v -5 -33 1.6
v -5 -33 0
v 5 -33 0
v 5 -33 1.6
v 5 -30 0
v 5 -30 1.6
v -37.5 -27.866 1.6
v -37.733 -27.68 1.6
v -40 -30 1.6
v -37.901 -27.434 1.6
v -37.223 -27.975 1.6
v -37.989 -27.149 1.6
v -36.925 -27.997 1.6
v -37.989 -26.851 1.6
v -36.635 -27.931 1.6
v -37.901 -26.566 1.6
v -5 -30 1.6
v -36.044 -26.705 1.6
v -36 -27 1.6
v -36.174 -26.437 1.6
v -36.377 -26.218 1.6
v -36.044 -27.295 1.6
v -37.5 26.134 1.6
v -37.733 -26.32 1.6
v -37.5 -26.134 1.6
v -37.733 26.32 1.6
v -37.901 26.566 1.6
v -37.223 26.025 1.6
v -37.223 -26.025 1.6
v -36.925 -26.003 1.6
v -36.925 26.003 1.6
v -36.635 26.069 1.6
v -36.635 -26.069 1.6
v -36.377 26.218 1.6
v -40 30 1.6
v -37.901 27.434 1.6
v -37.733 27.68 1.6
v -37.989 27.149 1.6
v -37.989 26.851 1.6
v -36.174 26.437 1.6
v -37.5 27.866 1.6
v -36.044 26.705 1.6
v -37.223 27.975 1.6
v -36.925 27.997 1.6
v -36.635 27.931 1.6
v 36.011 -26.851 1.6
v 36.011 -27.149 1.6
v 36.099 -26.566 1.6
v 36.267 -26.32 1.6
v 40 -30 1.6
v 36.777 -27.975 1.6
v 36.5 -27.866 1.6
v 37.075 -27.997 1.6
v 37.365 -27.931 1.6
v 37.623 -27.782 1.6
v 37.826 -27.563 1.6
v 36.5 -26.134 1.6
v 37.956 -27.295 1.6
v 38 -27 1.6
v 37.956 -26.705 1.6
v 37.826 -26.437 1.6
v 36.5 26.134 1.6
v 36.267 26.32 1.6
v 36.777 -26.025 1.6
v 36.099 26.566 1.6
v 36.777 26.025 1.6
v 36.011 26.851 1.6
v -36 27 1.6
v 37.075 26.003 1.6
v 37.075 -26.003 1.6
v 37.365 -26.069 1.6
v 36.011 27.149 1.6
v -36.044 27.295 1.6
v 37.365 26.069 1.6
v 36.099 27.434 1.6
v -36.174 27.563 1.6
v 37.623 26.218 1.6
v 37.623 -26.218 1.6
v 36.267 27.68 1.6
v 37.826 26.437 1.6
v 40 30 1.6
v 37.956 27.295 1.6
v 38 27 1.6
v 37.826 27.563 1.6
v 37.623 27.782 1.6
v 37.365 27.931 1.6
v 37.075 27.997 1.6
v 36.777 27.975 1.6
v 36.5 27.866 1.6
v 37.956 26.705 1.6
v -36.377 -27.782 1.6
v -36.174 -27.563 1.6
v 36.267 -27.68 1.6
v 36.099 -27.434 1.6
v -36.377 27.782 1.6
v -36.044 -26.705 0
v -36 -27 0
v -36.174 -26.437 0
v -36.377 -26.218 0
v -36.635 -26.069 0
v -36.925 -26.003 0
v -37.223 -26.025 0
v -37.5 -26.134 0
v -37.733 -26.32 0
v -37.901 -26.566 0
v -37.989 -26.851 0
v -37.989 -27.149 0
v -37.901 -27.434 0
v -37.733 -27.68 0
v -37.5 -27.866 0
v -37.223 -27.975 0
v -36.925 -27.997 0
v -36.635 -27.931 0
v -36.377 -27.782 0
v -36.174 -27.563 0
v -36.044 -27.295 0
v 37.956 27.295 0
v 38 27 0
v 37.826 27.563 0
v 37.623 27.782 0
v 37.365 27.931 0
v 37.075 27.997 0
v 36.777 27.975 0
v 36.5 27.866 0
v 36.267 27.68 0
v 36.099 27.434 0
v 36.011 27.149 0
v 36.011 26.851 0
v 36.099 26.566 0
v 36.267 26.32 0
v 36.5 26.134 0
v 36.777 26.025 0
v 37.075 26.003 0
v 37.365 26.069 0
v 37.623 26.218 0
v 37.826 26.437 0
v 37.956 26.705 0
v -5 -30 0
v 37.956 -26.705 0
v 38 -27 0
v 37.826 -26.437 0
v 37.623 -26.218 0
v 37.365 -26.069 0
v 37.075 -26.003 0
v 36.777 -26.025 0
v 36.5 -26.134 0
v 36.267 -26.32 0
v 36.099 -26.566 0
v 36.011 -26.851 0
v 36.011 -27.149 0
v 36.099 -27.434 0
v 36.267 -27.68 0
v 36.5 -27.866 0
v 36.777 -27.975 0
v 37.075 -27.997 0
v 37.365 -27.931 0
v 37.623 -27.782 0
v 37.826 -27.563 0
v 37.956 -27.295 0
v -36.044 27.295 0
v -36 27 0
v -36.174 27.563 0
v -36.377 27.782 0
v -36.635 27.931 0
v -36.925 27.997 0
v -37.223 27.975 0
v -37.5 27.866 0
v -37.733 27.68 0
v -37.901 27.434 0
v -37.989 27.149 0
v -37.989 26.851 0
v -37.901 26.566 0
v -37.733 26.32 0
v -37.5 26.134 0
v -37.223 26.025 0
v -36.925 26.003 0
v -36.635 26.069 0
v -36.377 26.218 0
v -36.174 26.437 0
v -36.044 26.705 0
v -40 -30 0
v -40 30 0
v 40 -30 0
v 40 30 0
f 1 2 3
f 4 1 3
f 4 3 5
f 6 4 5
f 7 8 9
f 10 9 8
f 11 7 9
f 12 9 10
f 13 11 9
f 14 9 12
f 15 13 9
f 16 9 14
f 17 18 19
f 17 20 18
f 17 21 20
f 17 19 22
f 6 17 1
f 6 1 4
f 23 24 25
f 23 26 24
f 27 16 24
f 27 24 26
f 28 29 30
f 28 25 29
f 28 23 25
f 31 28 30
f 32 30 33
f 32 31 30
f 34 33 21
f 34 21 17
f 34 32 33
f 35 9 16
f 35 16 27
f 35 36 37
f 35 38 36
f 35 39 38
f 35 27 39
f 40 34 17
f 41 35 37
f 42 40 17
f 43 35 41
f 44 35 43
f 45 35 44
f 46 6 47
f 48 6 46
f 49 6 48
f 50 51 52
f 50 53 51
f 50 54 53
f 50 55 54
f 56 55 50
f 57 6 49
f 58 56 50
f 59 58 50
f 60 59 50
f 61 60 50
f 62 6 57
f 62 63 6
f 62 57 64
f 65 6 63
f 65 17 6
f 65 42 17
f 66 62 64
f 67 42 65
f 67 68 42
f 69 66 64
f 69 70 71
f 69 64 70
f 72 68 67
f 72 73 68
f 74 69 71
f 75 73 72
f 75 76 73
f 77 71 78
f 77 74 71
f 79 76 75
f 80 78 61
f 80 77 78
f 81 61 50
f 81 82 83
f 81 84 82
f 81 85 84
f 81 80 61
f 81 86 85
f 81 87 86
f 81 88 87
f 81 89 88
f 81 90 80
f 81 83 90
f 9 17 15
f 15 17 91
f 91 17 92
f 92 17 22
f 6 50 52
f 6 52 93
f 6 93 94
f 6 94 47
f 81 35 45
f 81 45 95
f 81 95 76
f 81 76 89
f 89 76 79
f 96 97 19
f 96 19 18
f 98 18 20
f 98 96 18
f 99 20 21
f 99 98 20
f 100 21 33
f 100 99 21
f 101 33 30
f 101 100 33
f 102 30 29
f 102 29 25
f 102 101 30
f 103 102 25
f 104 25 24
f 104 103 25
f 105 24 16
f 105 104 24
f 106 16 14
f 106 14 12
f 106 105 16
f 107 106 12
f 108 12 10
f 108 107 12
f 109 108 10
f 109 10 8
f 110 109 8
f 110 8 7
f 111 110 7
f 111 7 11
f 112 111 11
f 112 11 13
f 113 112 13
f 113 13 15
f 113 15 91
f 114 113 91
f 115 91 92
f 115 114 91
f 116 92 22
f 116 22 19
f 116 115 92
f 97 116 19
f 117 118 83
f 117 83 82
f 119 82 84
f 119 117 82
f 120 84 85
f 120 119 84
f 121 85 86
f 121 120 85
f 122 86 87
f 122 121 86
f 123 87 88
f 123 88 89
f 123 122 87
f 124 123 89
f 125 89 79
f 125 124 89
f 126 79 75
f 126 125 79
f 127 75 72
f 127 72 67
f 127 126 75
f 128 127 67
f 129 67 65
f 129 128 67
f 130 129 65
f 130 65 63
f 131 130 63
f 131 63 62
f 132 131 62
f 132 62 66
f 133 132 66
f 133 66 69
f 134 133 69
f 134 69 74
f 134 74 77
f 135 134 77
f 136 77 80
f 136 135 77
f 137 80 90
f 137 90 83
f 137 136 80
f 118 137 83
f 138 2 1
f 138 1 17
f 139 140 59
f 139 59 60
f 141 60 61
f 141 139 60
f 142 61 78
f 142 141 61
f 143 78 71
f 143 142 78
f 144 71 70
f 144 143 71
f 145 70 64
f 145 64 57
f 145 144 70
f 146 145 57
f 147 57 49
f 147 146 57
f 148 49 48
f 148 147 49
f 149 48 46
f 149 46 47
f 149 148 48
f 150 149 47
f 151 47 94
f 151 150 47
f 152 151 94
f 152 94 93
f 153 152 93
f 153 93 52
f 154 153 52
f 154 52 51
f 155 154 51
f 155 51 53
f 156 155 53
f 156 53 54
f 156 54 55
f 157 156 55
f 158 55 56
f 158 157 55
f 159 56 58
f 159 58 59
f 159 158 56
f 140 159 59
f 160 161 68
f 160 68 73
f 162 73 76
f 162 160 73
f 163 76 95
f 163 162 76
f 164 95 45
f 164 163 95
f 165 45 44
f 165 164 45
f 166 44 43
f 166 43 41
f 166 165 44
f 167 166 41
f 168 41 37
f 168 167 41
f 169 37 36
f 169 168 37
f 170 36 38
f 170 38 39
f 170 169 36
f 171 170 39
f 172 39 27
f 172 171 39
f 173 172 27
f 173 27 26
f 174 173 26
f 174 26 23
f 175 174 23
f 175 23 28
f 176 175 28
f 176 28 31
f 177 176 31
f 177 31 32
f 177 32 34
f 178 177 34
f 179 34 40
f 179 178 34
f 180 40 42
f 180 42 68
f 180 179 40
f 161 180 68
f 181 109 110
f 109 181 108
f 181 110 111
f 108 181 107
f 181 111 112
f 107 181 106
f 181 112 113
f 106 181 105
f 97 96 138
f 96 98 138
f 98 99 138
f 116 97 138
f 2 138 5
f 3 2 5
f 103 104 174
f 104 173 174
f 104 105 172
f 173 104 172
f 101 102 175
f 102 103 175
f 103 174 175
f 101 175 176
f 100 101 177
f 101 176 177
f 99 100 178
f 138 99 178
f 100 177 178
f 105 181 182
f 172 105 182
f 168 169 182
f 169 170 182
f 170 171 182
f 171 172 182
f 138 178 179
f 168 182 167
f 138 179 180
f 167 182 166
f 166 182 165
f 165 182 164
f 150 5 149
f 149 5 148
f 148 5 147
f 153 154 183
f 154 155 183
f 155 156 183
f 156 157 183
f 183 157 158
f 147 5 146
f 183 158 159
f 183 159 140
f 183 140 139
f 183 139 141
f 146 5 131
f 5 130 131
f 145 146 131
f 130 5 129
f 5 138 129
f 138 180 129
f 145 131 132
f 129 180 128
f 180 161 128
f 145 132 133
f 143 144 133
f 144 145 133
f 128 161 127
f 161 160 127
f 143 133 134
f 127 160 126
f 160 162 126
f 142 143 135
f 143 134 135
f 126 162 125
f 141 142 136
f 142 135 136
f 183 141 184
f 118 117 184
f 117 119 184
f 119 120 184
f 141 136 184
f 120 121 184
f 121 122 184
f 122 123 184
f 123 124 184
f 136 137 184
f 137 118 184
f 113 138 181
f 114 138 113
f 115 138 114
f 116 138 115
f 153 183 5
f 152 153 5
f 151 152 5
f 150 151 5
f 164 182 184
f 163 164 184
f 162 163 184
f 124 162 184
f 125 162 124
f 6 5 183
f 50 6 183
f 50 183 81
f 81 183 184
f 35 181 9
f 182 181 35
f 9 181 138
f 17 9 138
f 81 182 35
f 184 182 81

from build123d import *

# Parameters (mm, degrees)
SKETCH_1_W      = 80
SKETCH_1_H      = 60
SKETCH_1_R      = 1
SKETCH_1_W_2    = 10
SKETCH_1_H_2    = 3
EXTRUDE_1_DEPTH = 1.6


with BuildPart() as part:
    # 草图1 → 凸台-拉伸1 (new body)
    # profile 1 of 2: a face of its own
    with BuildSketch(Plane.XY):
        Rectangle(SKETCH_1_W, SKETCH_1_H)
        with Locations((-37, 27)):
            Circle(SKETCH_1_R, mode=Mode.SUBTRACT)
        with Locations((37, 27)):
            Circle(SKETCH_1_R, mode=Mode.SUBTRACT)
        with Locations((37, -27)):
            Circle(SKETCH_1_R, mode=Mode.SUBTRACT)
        with Locations((-37, -27)):
            Circle(SKETCH_1_R, mode=Mode.SUBTRACT)
    # profile 2 of 2: a face of its own
    with BuildSketch(Plane.XY):
        with Locations((0, -31.5)):
            Rectangle(SKETCH_1_W_2, SKETCH_1_H_2)
    extrude(amount=EXTRUDE_1_DEPTH)


solid = part.part
